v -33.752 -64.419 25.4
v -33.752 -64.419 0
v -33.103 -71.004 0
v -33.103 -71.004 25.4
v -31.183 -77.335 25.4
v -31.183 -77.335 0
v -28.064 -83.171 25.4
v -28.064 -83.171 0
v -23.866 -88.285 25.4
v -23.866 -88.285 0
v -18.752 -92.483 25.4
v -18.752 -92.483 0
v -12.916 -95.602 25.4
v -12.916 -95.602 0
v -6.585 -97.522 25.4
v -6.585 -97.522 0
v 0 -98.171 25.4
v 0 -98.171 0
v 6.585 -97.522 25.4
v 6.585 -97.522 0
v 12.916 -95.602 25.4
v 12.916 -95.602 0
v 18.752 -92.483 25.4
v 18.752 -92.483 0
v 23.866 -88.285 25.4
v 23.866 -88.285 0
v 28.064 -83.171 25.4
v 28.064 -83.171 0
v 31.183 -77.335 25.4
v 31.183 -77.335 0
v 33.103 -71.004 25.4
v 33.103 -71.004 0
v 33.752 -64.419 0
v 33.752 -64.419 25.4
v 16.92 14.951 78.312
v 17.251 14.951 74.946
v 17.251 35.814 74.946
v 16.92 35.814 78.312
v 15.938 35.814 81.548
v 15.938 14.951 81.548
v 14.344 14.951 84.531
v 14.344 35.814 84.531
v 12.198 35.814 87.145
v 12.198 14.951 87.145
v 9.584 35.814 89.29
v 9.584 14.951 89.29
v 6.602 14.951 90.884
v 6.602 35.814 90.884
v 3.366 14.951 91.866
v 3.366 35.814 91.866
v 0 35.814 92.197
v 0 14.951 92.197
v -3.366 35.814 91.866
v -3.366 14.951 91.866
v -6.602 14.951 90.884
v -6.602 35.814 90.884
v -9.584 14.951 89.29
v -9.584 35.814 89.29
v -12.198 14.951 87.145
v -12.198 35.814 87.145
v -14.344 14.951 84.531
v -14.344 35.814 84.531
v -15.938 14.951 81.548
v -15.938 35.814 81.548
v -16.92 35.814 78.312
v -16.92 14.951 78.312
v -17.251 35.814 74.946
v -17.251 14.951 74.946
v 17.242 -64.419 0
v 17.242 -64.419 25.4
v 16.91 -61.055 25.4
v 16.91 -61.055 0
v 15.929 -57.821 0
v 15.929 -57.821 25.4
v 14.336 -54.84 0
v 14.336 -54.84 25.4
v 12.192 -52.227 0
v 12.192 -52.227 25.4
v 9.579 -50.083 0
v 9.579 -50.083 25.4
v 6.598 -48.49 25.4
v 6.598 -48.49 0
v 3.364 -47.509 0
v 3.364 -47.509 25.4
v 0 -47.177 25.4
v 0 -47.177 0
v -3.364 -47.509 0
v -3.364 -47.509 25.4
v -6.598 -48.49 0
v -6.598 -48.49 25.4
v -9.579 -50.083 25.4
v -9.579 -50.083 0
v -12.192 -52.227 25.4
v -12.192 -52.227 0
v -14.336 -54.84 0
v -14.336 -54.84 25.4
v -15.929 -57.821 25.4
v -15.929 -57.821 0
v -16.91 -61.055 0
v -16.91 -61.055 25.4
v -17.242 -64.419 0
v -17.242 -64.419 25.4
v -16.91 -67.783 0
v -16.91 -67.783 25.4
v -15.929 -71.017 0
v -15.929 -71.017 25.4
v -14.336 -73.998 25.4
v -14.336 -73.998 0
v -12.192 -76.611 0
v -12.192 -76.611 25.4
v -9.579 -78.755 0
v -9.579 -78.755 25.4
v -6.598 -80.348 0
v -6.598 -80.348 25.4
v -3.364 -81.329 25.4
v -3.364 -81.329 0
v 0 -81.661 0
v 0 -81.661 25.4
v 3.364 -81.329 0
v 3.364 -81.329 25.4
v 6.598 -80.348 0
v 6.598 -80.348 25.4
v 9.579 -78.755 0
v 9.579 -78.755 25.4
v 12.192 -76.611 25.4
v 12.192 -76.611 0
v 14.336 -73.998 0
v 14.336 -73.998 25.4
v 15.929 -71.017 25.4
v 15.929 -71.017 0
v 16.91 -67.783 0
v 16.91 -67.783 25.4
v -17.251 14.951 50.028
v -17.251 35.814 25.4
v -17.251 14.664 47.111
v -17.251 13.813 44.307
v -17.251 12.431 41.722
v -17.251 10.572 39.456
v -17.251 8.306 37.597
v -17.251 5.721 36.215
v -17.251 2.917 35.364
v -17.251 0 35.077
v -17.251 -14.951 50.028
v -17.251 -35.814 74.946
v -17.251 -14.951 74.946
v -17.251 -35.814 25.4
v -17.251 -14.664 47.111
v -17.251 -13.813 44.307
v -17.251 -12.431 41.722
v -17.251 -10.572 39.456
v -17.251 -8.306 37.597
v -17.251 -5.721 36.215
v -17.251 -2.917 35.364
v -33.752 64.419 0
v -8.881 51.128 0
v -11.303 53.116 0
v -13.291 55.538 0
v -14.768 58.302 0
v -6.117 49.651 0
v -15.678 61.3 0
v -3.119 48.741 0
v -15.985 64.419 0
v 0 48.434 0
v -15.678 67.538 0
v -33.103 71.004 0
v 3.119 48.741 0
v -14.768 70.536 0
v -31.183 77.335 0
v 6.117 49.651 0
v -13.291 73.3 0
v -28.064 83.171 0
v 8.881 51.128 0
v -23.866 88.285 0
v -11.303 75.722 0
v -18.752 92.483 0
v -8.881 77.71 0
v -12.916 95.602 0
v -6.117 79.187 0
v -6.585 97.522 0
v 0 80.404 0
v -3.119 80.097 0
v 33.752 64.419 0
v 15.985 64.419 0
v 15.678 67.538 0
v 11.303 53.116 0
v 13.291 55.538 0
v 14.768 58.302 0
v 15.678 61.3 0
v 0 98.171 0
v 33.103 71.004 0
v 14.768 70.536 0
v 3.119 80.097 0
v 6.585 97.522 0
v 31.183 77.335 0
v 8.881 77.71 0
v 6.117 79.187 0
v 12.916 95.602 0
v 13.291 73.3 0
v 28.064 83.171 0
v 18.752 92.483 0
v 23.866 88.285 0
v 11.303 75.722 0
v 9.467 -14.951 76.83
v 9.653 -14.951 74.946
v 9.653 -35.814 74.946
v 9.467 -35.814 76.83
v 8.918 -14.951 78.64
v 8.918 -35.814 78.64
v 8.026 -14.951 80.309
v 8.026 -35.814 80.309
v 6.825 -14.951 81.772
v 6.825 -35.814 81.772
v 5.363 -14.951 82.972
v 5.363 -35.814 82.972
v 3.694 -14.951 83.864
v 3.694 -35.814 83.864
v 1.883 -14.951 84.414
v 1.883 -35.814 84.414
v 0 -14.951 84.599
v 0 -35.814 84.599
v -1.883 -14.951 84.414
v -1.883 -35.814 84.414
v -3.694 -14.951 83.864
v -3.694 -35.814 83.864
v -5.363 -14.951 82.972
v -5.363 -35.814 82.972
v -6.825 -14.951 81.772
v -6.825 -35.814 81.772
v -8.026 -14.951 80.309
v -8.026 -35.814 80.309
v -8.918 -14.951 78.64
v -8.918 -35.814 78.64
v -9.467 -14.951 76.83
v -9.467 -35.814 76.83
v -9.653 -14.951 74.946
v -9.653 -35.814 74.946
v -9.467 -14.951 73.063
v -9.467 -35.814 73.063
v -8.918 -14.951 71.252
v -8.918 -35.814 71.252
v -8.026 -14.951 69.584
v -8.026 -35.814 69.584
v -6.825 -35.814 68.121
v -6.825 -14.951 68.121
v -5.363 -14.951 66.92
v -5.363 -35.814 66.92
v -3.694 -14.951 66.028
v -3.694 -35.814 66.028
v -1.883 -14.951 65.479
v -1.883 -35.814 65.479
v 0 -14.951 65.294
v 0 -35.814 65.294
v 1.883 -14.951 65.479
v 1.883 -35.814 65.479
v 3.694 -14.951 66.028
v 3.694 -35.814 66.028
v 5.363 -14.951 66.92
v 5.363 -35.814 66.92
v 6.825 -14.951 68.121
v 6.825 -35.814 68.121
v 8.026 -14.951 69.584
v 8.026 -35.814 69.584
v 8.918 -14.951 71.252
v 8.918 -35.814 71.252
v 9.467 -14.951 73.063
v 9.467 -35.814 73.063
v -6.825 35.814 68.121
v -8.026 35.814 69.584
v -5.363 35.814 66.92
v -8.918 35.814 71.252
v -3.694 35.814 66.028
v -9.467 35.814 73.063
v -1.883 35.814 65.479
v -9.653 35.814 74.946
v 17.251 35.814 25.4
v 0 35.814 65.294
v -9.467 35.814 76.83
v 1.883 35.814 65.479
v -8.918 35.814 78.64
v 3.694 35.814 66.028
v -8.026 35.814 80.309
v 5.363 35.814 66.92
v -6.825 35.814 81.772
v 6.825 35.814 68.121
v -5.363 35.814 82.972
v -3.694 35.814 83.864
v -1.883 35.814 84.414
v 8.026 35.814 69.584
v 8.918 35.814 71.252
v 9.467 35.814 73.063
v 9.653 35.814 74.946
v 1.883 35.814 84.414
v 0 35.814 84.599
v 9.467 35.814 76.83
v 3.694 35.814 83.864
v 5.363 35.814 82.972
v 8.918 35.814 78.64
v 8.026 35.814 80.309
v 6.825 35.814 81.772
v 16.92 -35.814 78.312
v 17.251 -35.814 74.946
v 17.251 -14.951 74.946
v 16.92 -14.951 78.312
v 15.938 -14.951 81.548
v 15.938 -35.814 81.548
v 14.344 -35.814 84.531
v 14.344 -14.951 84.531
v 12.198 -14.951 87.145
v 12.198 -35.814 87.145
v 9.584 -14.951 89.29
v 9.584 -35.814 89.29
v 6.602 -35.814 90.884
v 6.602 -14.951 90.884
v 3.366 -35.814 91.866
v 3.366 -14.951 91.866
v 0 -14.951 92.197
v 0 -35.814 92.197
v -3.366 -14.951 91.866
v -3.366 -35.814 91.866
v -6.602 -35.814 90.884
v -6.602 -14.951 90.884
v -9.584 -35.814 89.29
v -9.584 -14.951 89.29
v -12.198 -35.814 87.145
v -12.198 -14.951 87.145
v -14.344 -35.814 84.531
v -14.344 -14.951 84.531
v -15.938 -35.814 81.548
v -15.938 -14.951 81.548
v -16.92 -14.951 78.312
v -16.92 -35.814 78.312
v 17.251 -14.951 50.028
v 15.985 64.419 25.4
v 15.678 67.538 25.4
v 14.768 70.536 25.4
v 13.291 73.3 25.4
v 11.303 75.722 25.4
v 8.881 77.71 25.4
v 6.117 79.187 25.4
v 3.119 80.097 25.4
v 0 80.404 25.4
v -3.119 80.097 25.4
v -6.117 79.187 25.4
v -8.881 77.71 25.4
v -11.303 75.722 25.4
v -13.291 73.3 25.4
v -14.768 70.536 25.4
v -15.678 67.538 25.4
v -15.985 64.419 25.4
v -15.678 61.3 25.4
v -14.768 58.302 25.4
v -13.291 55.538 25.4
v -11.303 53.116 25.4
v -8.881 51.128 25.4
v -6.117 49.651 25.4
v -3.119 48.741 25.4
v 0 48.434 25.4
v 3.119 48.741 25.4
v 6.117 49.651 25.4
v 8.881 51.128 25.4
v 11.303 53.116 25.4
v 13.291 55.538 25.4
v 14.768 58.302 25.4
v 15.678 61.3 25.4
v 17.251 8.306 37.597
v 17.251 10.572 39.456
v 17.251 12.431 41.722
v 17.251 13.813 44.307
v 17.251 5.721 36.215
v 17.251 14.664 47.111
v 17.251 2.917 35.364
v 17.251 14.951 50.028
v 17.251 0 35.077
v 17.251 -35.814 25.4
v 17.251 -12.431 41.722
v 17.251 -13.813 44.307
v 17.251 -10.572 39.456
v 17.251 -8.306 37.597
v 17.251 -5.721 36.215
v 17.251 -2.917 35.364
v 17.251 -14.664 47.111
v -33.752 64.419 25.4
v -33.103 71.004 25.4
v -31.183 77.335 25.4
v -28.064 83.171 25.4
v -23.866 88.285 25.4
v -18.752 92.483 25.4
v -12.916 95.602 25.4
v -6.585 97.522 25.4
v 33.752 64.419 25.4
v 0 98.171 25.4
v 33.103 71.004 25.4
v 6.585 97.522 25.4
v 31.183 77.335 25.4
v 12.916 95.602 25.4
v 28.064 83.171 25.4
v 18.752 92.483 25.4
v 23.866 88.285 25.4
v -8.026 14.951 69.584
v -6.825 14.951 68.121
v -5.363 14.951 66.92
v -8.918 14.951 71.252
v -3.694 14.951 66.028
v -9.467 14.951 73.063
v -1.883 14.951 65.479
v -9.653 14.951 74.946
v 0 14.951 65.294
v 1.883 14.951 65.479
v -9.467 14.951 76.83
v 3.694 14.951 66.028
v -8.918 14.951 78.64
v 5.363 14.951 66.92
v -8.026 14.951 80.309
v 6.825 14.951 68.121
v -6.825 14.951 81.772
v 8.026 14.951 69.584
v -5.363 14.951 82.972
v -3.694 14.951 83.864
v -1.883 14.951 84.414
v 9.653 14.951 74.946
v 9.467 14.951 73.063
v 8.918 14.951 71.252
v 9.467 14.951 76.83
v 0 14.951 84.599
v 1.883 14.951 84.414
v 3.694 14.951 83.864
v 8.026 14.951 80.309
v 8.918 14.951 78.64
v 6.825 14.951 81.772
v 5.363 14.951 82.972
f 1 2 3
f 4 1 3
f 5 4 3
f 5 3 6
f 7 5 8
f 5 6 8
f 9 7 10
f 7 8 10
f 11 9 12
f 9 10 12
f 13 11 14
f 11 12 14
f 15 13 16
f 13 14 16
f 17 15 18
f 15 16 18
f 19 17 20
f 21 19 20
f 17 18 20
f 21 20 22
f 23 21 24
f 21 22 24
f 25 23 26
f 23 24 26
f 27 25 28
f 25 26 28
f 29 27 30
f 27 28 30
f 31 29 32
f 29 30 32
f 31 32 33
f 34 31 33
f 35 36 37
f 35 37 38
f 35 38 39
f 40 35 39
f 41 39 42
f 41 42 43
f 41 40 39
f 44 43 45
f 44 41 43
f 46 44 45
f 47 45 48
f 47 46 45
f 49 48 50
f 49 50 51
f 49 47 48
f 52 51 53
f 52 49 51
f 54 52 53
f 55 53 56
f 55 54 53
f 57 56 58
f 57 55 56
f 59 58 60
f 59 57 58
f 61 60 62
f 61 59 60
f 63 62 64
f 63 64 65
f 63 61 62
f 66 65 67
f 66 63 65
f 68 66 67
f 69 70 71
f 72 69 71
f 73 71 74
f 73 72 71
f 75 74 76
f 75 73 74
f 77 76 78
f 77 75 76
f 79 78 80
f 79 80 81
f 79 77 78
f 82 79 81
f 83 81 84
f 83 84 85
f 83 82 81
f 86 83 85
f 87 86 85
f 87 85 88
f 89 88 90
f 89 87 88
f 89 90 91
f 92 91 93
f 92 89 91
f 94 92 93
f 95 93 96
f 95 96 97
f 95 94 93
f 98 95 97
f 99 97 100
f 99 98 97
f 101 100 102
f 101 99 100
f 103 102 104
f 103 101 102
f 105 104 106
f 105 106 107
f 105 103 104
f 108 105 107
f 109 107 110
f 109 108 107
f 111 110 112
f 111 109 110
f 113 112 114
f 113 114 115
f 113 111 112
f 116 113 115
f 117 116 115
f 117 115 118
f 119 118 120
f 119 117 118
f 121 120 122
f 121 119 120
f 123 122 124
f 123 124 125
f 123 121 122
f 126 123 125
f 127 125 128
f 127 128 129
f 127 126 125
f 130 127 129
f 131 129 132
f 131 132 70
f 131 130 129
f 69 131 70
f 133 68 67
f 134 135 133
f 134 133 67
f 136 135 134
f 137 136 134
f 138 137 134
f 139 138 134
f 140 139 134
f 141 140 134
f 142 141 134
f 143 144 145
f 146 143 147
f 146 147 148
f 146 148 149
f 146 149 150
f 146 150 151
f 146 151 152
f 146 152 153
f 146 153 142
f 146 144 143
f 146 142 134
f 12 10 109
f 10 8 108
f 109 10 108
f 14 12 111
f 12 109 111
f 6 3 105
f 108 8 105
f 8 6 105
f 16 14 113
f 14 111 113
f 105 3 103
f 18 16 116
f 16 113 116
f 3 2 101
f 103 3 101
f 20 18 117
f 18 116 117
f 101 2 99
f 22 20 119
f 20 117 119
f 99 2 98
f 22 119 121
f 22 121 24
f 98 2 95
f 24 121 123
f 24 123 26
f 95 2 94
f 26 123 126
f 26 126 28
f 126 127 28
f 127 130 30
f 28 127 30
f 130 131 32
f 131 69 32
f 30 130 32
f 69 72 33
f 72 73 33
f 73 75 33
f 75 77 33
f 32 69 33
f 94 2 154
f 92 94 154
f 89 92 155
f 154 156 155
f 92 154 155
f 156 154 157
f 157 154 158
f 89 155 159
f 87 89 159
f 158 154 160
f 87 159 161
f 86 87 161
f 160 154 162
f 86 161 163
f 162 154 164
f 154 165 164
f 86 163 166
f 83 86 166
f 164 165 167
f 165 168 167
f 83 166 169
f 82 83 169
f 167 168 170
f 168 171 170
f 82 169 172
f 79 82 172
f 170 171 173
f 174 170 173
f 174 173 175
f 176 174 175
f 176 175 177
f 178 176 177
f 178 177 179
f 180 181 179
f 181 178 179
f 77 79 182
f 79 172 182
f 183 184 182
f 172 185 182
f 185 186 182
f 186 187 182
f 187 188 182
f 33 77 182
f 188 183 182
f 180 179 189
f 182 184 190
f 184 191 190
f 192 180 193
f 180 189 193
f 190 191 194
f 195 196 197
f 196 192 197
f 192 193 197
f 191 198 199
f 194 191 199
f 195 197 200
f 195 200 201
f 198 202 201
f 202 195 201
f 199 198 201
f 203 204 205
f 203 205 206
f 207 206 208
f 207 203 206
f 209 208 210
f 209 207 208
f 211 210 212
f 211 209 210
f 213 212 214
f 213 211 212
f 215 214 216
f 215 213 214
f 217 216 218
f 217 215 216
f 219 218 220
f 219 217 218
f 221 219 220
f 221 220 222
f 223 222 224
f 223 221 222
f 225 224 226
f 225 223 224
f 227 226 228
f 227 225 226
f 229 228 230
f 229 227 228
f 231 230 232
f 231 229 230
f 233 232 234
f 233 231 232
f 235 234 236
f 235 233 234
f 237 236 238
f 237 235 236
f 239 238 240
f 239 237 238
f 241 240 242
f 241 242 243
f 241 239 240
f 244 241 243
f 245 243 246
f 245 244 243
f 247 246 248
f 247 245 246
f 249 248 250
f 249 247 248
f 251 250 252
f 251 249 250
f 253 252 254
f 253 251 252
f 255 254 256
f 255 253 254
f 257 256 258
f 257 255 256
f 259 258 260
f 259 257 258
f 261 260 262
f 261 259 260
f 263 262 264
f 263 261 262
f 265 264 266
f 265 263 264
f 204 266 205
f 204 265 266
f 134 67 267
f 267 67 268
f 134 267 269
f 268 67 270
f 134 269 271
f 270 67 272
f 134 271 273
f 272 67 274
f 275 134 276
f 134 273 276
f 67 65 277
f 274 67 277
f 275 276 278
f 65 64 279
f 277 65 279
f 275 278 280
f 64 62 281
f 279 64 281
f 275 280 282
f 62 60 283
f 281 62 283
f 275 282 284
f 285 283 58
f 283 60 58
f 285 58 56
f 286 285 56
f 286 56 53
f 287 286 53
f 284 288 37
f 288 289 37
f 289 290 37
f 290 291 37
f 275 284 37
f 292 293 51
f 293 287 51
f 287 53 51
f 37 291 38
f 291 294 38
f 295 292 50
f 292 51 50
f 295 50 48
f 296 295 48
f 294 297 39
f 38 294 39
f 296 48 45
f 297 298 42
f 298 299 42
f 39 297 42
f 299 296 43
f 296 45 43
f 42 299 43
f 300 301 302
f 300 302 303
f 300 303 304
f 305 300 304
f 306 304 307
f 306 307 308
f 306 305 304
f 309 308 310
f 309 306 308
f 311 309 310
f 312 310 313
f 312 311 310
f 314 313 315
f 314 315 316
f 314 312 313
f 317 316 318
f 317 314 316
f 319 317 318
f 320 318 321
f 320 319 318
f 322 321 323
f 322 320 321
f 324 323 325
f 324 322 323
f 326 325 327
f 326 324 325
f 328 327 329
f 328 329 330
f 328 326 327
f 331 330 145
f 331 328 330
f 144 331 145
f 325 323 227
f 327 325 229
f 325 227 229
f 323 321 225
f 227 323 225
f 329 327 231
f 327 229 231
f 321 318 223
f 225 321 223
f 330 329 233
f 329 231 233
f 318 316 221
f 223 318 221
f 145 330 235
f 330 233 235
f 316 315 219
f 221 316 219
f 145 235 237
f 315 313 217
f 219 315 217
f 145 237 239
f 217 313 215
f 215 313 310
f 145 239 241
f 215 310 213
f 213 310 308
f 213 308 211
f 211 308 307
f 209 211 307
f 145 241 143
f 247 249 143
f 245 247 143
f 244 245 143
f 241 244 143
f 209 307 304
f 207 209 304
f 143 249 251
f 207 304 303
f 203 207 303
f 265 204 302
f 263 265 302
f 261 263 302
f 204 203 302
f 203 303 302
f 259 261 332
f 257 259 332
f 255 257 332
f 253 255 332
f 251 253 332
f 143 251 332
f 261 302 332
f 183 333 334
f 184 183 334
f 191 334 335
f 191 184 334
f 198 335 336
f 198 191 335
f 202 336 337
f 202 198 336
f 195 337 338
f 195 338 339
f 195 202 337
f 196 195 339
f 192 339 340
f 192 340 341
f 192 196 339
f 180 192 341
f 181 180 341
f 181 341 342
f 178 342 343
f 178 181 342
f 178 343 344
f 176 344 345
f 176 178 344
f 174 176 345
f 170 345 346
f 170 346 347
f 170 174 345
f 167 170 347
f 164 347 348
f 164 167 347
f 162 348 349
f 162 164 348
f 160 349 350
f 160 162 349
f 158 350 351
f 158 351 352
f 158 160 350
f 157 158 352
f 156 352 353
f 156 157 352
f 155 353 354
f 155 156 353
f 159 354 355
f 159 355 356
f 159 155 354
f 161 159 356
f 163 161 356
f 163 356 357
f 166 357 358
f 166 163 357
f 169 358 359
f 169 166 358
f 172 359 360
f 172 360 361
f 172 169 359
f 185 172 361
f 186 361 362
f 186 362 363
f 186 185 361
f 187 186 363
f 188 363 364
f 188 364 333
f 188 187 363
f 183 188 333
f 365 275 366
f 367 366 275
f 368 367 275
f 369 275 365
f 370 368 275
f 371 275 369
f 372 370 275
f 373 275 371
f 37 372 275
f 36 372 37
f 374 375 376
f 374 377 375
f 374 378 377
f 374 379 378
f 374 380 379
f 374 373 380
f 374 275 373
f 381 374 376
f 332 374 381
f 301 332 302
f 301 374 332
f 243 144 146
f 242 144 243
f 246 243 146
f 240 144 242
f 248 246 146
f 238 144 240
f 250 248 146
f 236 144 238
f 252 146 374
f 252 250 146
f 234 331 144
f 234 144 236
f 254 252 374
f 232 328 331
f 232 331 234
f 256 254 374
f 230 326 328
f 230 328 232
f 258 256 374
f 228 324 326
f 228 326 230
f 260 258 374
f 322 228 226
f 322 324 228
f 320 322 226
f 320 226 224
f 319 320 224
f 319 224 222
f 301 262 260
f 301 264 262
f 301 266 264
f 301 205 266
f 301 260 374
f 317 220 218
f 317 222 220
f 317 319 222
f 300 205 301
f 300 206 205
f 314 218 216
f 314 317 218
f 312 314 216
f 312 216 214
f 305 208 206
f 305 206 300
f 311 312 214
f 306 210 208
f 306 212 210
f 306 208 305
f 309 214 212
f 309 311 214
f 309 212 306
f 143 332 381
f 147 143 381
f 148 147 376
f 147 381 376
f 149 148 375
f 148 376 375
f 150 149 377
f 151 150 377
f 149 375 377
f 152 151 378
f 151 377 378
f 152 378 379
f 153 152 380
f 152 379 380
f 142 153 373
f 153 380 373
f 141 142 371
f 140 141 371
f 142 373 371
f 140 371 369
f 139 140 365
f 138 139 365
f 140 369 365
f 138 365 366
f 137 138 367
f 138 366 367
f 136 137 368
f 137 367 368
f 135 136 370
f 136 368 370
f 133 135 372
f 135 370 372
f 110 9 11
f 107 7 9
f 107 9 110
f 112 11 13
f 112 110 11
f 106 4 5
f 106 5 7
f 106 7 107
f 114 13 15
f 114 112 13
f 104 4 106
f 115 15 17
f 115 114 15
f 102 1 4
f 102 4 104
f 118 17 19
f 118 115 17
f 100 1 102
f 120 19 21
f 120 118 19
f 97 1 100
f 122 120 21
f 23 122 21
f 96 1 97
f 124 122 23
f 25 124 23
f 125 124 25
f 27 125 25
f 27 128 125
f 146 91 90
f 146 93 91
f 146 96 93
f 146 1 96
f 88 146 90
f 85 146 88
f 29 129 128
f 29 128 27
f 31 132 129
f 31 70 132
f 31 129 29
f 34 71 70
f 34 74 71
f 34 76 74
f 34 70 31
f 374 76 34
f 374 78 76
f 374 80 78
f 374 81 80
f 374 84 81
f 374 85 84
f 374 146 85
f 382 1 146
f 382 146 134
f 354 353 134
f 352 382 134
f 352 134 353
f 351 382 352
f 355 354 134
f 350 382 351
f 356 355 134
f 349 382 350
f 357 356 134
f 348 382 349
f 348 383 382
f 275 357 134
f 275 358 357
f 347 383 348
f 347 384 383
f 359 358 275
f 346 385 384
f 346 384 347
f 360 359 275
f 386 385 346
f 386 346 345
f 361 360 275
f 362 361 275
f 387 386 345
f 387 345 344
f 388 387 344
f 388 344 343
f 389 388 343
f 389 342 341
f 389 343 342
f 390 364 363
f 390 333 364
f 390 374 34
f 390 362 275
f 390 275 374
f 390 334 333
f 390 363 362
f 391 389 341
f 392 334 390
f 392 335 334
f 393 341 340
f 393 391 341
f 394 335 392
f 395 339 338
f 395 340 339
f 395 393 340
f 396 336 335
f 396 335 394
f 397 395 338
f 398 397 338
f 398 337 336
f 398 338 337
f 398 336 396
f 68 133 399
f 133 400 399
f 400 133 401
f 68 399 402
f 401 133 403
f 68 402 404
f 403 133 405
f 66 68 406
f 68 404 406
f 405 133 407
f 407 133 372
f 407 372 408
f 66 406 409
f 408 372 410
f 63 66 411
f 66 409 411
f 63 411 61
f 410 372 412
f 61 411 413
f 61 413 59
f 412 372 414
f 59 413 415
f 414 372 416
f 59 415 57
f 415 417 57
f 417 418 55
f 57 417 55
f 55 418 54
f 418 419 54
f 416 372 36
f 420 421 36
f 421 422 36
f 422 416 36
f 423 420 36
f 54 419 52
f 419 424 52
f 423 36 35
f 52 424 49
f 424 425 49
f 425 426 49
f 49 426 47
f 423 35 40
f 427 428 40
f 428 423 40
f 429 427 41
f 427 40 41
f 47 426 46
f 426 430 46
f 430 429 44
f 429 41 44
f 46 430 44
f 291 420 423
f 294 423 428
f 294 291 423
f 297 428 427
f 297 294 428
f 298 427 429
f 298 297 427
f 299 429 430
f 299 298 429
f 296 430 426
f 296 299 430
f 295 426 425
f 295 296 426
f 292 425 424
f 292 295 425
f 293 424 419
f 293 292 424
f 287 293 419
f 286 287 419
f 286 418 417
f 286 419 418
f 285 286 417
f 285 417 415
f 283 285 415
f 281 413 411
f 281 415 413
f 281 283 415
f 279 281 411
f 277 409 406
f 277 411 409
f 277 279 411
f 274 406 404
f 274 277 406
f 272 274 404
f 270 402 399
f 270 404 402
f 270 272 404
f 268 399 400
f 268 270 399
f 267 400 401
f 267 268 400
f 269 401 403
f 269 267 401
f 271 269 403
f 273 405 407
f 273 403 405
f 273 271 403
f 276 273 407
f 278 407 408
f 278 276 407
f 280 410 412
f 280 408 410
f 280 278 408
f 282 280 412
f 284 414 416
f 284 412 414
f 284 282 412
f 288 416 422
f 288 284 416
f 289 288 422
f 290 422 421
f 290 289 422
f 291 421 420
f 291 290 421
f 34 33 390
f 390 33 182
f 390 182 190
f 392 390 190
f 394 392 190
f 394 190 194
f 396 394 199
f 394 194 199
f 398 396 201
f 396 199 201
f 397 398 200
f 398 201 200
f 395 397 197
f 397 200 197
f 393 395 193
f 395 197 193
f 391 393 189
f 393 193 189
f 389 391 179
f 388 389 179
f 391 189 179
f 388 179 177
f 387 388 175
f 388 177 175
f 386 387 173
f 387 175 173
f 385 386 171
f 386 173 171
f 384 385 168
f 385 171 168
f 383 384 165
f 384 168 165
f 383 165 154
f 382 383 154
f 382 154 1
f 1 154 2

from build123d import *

# Parameters (mm, degrees)
F0_R     = 17.2417566051
F0_R_2   = 15.9851491333
F1_DEPTH = 25.4
F2_R     = 9.6526962005
F3_DEPTH = 35.814
F5_DEPTH = 635


with BuildPart() as f1:
    # F0 (on Top) → F1 (new body)
    with BuildSketch(Plane.XY):
        with BuildLine():
            ThreePointArc((-33.7519310415, -64.4190087914), (0, -98.1709398329), (33.7519310415, -64.4190087914))
            Line((33.7519310415, -64.4190087914), (33.7519310415, 64.4190087914))
            ThreePointArc((33.7519310415, 64.4190087914), (0, 98.1709398329), (-33.7519310415, 64.4190087914))
            Line((-33.7519310415, 64.4190087914), (-33.7519310415, -64.4190087914))
        make_face()
        with Locations((0, -64.4190087914)):
            Circle(F0_R, mode=Mode.SUBTRACT)
        with Locations((0, 64.4190087914)):
            Circle(F0_R_2, mode=Mode.SUBTRACT)
    extrude(amount=F1_DEPTH)

    # F2 (on Front) → F3 (join, symmetric)
    with BuildSketch(Plane.XZ):
        with BuildLine():
            Line((-17.2510873526, 24.3432018906), (17.2510873526, 24.3432018906))
            Line((17.2510873526, 24.3432018906), (17.2510873526, 74.9463941902))
            ThreePointArc((17.2510873526, 74.9463941902), (0, 92.1974815428), (-17.2510873526, 74.9463941902))
            Line((-17.2510873526, 74.9463941902), (-17.2510873526, 24.3432018906))
        make_face()
        with Locations((0, 74.9463941902)):
            Circle(F2_R, mode=Mode.SUBTRACT)
    extrude(amount=F3_DEPTH, both=True)

    # F4 (on Right) → F5 (cut, symmetric)
    with BuildSketch(Plane.YZ):
        with BuildLine():
            ThreePointArc((-14.9509394541, 50.0281564891), (0, 35.077217035), (14.9509394541, 50.0281564891))
            Line((14.9509394541, 50.0281564891), (-14.9509394541, 50.0281564891))
        make_face()
        with BuildLine():
            ThreePointArc((-14.9509394541, 50.0281564891), (0, 64.9790959433), (14.9509394541, 50.0281564891))
            Line((14.9509394541, 50.0281564891), (14.9509394541, 93.7309004366))
            Line((14.9509394541, 93.7309004366), (-14.9509394541, 93.7309004366))
            Line((-14.9509394541, 93.7309004366), (-14.9509394541, 50.0281564891))
        make_face()
        with BuildLine():
            Line((-14.9509394541, 50.0281564891), (14.9509394541, 50.0281564891))
            ThreePointArc((14.9509394541, 50.0281564891), (0, 64.9790959433), (-14.9509394541, 50.0281564891))
        make_face()
    extrude(amount=F5_DEPTH, both=True, mode=Mode.SUBTRACT)


solid = f1.part
